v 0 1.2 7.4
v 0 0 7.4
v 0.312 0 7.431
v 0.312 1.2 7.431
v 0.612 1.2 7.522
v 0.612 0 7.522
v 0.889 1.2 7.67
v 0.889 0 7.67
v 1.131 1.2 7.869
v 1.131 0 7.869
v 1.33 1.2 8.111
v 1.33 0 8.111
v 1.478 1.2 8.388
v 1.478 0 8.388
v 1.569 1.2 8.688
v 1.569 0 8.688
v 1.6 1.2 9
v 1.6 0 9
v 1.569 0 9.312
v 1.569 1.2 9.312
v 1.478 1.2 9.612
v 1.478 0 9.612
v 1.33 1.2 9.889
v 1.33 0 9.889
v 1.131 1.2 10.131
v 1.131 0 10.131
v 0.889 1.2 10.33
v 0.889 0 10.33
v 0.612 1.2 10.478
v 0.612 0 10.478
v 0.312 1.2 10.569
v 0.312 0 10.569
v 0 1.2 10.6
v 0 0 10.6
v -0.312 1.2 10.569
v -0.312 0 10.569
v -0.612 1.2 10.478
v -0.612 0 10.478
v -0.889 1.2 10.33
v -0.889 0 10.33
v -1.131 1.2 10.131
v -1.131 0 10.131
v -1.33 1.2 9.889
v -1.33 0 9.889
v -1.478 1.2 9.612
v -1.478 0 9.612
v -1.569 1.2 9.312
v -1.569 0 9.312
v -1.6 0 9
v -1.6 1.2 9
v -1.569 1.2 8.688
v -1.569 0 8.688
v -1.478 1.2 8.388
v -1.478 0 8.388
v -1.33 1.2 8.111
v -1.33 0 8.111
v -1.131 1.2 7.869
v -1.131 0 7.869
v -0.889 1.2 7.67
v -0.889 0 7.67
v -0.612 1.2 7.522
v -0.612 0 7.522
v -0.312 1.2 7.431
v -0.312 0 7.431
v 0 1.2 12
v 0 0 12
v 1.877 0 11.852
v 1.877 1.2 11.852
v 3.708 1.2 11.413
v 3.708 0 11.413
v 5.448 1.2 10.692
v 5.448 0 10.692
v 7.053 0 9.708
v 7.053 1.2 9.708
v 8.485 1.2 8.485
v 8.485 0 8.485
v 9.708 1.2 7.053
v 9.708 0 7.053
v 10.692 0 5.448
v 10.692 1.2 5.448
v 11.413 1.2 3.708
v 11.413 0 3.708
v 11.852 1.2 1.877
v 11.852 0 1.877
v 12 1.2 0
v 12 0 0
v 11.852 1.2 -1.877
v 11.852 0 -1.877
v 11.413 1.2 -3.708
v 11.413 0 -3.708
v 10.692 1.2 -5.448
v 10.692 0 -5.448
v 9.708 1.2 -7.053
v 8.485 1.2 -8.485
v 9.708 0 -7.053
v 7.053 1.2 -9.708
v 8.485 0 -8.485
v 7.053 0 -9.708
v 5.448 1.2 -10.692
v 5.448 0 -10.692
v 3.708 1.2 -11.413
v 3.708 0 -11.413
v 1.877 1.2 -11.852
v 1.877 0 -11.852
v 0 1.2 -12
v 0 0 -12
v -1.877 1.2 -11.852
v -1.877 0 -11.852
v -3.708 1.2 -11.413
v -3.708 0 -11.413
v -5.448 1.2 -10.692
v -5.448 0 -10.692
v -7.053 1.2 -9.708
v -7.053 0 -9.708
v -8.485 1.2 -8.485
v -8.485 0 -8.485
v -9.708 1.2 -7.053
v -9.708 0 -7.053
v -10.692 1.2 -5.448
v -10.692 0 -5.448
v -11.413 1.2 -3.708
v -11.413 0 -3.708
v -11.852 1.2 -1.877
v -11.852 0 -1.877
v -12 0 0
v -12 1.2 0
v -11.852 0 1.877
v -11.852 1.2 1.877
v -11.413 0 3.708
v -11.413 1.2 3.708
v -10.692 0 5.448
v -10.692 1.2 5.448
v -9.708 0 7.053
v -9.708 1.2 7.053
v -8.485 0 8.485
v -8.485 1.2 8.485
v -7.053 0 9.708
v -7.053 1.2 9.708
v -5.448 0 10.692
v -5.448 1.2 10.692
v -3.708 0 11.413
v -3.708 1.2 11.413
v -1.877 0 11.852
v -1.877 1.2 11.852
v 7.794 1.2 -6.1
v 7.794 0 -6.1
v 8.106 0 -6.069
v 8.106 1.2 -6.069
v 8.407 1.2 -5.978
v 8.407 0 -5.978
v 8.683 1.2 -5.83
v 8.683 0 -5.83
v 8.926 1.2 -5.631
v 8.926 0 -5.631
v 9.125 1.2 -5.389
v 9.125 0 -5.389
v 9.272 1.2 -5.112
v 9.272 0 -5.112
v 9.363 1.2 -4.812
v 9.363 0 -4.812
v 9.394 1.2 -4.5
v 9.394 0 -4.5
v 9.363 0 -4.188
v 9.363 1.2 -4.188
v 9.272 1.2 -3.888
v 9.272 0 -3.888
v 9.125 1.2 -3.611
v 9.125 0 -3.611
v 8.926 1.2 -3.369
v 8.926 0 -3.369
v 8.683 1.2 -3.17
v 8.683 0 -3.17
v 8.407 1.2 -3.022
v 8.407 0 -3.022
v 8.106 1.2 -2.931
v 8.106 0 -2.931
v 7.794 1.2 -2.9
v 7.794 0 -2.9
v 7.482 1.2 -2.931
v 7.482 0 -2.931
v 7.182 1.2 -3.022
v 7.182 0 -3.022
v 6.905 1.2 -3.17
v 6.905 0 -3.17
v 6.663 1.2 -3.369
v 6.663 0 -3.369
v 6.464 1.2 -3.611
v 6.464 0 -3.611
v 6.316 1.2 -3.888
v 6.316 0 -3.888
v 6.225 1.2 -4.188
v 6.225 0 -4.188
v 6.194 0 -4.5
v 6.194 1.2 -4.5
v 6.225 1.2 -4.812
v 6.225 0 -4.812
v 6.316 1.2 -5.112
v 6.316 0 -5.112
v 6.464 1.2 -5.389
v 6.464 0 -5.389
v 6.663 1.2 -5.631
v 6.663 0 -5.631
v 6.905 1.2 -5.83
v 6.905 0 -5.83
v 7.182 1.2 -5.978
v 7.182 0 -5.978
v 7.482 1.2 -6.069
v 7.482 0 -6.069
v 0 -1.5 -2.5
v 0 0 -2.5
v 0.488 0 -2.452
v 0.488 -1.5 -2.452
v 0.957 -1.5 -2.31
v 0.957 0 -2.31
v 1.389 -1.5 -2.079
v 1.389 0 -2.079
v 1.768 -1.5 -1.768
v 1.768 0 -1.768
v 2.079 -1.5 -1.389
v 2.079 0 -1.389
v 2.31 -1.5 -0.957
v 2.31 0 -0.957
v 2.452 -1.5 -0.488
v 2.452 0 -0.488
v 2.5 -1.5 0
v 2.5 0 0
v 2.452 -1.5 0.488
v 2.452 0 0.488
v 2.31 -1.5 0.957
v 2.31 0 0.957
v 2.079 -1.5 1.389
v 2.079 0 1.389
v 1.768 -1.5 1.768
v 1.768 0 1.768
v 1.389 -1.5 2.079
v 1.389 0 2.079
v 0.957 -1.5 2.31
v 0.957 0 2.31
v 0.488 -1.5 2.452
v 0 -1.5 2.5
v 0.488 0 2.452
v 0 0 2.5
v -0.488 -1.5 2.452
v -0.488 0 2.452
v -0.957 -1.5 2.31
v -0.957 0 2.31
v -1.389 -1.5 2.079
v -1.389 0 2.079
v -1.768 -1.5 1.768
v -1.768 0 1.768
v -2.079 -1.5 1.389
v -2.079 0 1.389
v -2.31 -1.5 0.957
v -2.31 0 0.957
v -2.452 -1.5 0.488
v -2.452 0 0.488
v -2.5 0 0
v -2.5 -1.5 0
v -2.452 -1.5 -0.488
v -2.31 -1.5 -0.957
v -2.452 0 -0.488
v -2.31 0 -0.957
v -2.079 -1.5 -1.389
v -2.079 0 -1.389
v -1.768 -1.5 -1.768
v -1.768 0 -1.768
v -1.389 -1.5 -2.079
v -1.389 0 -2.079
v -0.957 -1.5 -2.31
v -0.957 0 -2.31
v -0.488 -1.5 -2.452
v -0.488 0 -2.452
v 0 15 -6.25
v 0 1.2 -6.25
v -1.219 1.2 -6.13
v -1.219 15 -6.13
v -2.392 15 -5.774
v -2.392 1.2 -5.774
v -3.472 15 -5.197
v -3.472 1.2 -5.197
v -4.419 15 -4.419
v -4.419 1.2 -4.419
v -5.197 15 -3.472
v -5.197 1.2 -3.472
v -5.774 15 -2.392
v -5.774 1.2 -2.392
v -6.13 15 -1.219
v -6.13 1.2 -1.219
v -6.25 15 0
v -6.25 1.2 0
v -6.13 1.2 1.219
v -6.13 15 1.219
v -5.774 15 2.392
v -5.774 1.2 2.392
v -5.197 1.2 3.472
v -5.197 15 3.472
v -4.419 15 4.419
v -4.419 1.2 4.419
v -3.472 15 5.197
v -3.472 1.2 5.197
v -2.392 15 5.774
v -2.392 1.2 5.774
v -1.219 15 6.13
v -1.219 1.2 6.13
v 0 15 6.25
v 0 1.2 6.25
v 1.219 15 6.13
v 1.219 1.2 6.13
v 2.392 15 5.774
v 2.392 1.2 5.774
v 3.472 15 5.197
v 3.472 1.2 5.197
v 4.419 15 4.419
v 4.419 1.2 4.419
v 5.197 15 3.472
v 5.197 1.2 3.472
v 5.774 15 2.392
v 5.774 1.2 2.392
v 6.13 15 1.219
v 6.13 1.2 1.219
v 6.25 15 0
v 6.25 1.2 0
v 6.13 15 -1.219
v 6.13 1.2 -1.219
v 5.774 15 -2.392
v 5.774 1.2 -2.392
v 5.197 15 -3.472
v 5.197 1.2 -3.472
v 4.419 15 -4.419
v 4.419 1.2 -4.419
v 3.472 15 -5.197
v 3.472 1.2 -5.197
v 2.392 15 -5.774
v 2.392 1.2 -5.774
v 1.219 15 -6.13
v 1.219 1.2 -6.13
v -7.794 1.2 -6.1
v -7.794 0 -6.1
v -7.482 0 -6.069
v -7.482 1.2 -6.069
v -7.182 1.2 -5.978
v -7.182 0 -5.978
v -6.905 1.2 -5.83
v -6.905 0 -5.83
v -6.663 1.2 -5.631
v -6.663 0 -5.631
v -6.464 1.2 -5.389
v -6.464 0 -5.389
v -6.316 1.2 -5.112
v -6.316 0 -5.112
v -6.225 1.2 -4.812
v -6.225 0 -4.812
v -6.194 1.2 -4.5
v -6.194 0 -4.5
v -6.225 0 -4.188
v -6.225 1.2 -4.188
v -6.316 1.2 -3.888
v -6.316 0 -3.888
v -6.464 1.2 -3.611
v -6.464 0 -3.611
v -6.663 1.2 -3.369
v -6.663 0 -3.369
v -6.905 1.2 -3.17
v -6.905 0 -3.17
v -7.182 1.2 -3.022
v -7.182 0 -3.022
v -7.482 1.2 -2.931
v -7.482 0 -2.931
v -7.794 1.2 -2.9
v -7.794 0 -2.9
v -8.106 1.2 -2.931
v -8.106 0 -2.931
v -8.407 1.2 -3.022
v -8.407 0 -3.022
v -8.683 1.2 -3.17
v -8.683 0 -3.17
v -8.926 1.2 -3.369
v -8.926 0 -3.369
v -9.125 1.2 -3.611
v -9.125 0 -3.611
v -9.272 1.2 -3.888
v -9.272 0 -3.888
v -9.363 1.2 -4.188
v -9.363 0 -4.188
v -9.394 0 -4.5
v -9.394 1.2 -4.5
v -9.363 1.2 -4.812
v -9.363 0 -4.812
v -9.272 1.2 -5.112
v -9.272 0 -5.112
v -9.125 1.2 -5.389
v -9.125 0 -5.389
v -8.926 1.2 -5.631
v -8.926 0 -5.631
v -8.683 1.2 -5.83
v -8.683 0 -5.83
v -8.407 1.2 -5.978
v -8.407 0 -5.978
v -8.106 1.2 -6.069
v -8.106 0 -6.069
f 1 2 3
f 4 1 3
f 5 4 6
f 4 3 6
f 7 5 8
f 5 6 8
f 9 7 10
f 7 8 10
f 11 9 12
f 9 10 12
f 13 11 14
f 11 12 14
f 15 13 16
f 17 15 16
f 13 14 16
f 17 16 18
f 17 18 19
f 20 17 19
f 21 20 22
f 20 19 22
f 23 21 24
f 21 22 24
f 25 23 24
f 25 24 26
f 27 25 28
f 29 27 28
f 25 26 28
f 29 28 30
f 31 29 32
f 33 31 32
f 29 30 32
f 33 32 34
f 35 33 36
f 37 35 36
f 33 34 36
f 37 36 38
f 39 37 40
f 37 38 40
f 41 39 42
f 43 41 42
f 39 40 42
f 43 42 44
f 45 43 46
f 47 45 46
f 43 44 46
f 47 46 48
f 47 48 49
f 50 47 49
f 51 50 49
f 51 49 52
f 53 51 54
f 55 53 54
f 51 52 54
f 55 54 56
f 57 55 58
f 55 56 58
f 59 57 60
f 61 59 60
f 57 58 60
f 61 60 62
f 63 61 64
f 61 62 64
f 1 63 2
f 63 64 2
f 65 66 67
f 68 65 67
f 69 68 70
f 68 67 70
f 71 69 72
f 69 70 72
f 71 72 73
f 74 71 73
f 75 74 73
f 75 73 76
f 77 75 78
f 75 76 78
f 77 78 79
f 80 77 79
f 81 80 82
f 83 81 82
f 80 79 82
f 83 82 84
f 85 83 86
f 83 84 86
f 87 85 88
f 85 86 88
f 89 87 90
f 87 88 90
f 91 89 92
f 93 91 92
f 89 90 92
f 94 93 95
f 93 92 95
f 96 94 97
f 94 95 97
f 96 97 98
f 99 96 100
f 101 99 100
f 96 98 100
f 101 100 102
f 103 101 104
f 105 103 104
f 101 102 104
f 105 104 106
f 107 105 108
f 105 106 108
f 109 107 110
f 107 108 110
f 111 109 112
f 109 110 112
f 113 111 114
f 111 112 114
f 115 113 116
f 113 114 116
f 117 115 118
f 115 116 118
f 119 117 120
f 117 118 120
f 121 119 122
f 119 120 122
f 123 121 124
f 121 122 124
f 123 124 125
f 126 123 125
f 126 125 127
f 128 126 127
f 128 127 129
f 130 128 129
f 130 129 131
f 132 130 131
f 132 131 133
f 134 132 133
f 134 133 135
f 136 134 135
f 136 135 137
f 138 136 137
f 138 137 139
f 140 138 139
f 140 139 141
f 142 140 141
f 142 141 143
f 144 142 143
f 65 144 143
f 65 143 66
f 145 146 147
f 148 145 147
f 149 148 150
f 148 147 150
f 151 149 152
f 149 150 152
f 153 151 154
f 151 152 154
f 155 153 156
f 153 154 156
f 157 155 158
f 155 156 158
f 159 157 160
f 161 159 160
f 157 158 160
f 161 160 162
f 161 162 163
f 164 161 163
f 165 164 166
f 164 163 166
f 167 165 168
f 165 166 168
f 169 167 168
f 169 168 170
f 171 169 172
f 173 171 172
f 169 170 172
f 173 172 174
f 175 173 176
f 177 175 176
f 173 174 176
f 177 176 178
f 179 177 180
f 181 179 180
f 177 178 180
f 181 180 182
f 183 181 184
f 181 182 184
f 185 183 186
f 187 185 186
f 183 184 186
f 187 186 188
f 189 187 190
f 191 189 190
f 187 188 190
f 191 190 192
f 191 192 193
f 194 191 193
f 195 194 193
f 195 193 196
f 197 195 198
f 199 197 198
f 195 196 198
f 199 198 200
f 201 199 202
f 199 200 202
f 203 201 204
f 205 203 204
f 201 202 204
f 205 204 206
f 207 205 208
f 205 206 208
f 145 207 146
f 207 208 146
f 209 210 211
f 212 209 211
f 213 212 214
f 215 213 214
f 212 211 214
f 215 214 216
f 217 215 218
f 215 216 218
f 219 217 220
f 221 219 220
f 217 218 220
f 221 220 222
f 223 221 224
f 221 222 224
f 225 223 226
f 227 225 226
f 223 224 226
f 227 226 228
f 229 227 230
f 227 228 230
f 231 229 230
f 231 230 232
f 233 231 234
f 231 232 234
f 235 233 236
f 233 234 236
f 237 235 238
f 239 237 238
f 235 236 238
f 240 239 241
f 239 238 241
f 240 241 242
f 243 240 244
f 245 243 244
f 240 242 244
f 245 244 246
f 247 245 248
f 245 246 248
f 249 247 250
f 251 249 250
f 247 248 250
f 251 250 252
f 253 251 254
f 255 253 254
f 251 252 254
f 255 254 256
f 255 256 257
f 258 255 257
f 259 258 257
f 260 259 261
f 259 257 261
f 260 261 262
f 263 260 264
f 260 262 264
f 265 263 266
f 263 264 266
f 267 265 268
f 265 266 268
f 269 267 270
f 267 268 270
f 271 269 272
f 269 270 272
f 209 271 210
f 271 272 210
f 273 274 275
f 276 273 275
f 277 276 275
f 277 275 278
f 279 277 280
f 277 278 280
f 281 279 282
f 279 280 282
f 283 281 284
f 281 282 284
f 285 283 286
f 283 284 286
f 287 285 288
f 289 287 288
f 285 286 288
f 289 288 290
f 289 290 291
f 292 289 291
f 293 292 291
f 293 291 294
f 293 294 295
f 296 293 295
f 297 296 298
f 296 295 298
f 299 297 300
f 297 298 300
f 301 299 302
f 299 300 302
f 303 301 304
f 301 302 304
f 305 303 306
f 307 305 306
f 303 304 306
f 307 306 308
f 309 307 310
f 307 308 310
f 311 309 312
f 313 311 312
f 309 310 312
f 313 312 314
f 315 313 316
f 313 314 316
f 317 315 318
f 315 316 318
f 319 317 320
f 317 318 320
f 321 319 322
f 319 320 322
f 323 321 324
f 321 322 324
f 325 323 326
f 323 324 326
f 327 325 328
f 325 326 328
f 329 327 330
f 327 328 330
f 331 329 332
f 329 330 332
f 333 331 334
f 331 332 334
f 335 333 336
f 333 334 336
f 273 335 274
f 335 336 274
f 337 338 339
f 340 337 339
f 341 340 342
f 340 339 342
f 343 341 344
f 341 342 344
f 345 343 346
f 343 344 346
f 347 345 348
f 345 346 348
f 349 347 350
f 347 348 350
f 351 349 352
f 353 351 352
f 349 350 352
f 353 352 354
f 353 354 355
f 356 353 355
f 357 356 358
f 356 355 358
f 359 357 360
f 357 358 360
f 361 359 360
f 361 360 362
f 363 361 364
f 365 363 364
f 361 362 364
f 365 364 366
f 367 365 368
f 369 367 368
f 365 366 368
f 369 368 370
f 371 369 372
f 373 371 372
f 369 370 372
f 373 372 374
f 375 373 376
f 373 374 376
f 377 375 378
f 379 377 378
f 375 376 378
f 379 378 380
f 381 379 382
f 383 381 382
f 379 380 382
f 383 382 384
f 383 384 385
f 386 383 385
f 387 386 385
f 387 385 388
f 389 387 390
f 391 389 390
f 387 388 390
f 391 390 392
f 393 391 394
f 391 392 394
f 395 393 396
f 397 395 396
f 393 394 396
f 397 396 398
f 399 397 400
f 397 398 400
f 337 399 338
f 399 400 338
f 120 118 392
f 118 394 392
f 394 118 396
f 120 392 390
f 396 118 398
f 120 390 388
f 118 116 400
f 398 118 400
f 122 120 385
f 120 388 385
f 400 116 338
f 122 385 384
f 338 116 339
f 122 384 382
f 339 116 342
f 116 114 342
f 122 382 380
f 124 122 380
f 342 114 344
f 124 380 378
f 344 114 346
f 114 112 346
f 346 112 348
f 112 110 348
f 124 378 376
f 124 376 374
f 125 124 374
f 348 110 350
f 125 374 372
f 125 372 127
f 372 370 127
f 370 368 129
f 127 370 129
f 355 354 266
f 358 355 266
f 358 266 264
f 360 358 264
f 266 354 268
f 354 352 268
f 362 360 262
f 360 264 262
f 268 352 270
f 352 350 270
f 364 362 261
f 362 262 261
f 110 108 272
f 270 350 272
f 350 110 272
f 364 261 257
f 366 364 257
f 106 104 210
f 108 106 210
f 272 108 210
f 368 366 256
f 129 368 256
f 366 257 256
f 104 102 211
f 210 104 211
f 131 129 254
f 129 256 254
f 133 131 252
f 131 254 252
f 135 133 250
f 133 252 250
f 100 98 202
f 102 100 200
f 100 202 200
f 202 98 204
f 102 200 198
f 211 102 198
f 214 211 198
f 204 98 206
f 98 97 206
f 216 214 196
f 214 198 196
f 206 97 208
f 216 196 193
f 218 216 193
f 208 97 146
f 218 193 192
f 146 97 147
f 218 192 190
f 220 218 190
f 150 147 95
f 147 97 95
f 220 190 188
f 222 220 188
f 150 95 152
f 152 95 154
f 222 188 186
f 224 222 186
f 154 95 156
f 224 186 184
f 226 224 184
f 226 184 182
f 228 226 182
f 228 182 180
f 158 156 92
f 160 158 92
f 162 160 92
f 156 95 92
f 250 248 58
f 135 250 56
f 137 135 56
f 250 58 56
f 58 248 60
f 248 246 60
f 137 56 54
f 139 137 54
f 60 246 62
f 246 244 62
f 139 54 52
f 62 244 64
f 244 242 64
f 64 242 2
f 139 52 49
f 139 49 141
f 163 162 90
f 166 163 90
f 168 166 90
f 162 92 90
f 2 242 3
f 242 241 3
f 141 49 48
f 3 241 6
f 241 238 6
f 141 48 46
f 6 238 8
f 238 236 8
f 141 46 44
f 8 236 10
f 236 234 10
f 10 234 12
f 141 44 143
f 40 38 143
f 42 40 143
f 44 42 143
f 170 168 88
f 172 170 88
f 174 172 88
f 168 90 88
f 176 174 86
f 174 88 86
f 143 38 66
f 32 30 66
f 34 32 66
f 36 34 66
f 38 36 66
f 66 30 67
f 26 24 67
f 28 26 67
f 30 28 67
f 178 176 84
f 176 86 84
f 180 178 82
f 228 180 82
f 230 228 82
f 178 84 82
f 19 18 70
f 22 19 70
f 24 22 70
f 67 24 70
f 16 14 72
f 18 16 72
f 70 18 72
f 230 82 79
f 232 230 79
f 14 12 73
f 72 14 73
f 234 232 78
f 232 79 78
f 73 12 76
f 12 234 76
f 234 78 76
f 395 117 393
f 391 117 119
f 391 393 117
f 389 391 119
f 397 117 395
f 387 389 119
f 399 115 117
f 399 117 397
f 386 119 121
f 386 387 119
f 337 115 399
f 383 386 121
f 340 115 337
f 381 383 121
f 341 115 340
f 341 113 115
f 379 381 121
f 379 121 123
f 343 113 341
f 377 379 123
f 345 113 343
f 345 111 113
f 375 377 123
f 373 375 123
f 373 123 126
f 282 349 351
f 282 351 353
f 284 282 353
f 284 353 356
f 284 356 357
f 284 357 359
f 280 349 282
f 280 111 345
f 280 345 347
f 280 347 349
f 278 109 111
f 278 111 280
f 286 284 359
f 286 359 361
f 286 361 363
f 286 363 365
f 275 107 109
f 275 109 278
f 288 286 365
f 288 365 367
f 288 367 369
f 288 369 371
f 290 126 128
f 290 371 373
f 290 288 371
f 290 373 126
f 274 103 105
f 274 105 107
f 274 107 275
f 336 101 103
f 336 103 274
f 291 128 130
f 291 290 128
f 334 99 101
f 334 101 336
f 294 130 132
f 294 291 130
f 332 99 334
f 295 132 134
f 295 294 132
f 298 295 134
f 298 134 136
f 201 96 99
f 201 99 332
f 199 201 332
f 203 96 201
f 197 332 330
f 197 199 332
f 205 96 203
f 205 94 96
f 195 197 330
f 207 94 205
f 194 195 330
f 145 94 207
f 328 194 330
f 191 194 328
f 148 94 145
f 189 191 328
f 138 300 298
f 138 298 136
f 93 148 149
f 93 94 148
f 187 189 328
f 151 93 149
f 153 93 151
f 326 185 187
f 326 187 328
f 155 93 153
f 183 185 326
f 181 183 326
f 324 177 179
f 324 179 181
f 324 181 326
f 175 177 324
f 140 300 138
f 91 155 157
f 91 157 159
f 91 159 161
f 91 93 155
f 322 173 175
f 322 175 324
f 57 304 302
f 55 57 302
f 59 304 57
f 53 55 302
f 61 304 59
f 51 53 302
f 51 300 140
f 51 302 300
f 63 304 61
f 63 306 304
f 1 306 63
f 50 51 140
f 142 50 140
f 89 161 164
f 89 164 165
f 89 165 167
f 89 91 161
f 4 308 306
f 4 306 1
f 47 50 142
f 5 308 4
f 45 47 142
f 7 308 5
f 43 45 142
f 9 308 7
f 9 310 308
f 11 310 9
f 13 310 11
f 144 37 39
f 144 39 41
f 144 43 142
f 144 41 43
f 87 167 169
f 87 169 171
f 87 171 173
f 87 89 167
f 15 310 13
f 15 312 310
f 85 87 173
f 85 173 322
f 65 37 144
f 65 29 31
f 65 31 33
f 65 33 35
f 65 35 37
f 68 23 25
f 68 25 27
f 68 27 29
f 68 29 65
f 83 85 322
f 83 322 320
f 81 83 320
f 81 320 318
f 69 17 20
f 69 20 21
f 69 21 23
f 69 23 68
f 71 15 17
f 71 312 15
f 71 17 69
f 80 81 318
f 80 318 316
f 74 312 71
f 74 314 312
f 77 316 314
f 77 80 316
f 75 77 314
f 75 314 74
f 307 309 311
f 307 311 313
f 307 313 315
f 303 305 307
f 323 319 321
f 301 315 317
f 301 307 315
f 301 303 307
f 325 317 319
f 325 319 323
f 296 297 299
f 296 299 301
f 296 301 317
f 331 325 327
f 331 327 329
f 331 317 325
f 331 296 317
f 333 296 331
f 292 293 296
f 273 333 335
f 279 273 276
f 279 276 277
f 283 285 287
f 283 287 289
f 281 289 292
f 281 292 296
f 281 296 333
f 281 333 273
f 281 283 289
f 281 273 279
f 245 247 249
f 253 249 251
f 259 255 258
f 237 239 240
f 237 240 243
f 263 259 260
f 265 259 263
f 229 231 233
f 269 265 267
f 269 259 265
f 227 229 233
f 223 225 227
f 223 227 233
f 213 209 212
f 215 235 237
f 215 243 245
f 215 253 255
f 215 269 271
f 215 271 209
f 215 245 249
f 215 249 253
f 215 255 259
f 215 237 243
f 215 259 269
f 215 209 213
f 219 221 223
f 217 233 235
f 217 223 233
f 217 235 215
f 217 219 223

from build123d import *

# Parameters (mm, degrees)
SKETCH1_R           = 12
BOSS_EXTRUDE1_DEPTH = 1.2
SKETCH2_R           = 6.25
BOSS_EXTRUDE2_DEPTH = 13.8
SKETCH3_R           = 2.5
BOSS_EXTRUDE3_DEPTH = 1.5
SKETCH4_R           = 1.6
CUT_EXTRUDE1_DEPTH  = 1.2


with BuildPart() as part:
    # Sketch1 → Boss-Extrude1 (new body)
    with BuildSketch(Plane(origin=(0, 0, 0), x_dir=(1, 0, 0), z_dir=(0, 1, 0))):
        with Locations(Location((0, 0, 0), (0, 0, 270))):
            Circle(SKETCH1_R)
    extrude(amount=BOSS_EXTRUDE1_DEPTH)

    # Sketch2 → Boss-Extrude2 (add)
    with BuildSketch(Plane(origin=(0, 1.2, 0), x_dir=(1, 0, 0), z_dir=(0, 1, 0))):
        with Locations(Location((0, 0, 0), (0, 0, 90))):
            Circle(SKETCH2_R)
    extrude(amount=BOSS_EXTRUDE2_DEPTH)

    # Sketch3 → Boss-Extrude3 (add)
    with BuildSketch(Plane.XZ):
        with Locations(Location((0, 0, 0), (0, 0, 270))):
            Circle(SKETCH3_R)
    extrude(amount=BOSS_EXTRUDE3_DEPTH)

    # Sketch4 → Cut-Extrude1 (cut)
    with BuildSketch(Plane.XZ):
        with Locations(Location((0, 9, 0), (0, 0, 270))):
            Circle(SKETCH4_R)
        with Locations(Location((7.794228634, -4.5, 0), (0, 0, 270))):
            Circle(SKETCH4_R)
        with Locations(Location((-7.794228634, -4.5, 0), (0, 0, 270))):
            Circle(SKETCH4_R)
    extrude(amount=-CUT_EXTRUDE1_DEPTH, mode=Mode.SUBTRACT)


solid = part.part
